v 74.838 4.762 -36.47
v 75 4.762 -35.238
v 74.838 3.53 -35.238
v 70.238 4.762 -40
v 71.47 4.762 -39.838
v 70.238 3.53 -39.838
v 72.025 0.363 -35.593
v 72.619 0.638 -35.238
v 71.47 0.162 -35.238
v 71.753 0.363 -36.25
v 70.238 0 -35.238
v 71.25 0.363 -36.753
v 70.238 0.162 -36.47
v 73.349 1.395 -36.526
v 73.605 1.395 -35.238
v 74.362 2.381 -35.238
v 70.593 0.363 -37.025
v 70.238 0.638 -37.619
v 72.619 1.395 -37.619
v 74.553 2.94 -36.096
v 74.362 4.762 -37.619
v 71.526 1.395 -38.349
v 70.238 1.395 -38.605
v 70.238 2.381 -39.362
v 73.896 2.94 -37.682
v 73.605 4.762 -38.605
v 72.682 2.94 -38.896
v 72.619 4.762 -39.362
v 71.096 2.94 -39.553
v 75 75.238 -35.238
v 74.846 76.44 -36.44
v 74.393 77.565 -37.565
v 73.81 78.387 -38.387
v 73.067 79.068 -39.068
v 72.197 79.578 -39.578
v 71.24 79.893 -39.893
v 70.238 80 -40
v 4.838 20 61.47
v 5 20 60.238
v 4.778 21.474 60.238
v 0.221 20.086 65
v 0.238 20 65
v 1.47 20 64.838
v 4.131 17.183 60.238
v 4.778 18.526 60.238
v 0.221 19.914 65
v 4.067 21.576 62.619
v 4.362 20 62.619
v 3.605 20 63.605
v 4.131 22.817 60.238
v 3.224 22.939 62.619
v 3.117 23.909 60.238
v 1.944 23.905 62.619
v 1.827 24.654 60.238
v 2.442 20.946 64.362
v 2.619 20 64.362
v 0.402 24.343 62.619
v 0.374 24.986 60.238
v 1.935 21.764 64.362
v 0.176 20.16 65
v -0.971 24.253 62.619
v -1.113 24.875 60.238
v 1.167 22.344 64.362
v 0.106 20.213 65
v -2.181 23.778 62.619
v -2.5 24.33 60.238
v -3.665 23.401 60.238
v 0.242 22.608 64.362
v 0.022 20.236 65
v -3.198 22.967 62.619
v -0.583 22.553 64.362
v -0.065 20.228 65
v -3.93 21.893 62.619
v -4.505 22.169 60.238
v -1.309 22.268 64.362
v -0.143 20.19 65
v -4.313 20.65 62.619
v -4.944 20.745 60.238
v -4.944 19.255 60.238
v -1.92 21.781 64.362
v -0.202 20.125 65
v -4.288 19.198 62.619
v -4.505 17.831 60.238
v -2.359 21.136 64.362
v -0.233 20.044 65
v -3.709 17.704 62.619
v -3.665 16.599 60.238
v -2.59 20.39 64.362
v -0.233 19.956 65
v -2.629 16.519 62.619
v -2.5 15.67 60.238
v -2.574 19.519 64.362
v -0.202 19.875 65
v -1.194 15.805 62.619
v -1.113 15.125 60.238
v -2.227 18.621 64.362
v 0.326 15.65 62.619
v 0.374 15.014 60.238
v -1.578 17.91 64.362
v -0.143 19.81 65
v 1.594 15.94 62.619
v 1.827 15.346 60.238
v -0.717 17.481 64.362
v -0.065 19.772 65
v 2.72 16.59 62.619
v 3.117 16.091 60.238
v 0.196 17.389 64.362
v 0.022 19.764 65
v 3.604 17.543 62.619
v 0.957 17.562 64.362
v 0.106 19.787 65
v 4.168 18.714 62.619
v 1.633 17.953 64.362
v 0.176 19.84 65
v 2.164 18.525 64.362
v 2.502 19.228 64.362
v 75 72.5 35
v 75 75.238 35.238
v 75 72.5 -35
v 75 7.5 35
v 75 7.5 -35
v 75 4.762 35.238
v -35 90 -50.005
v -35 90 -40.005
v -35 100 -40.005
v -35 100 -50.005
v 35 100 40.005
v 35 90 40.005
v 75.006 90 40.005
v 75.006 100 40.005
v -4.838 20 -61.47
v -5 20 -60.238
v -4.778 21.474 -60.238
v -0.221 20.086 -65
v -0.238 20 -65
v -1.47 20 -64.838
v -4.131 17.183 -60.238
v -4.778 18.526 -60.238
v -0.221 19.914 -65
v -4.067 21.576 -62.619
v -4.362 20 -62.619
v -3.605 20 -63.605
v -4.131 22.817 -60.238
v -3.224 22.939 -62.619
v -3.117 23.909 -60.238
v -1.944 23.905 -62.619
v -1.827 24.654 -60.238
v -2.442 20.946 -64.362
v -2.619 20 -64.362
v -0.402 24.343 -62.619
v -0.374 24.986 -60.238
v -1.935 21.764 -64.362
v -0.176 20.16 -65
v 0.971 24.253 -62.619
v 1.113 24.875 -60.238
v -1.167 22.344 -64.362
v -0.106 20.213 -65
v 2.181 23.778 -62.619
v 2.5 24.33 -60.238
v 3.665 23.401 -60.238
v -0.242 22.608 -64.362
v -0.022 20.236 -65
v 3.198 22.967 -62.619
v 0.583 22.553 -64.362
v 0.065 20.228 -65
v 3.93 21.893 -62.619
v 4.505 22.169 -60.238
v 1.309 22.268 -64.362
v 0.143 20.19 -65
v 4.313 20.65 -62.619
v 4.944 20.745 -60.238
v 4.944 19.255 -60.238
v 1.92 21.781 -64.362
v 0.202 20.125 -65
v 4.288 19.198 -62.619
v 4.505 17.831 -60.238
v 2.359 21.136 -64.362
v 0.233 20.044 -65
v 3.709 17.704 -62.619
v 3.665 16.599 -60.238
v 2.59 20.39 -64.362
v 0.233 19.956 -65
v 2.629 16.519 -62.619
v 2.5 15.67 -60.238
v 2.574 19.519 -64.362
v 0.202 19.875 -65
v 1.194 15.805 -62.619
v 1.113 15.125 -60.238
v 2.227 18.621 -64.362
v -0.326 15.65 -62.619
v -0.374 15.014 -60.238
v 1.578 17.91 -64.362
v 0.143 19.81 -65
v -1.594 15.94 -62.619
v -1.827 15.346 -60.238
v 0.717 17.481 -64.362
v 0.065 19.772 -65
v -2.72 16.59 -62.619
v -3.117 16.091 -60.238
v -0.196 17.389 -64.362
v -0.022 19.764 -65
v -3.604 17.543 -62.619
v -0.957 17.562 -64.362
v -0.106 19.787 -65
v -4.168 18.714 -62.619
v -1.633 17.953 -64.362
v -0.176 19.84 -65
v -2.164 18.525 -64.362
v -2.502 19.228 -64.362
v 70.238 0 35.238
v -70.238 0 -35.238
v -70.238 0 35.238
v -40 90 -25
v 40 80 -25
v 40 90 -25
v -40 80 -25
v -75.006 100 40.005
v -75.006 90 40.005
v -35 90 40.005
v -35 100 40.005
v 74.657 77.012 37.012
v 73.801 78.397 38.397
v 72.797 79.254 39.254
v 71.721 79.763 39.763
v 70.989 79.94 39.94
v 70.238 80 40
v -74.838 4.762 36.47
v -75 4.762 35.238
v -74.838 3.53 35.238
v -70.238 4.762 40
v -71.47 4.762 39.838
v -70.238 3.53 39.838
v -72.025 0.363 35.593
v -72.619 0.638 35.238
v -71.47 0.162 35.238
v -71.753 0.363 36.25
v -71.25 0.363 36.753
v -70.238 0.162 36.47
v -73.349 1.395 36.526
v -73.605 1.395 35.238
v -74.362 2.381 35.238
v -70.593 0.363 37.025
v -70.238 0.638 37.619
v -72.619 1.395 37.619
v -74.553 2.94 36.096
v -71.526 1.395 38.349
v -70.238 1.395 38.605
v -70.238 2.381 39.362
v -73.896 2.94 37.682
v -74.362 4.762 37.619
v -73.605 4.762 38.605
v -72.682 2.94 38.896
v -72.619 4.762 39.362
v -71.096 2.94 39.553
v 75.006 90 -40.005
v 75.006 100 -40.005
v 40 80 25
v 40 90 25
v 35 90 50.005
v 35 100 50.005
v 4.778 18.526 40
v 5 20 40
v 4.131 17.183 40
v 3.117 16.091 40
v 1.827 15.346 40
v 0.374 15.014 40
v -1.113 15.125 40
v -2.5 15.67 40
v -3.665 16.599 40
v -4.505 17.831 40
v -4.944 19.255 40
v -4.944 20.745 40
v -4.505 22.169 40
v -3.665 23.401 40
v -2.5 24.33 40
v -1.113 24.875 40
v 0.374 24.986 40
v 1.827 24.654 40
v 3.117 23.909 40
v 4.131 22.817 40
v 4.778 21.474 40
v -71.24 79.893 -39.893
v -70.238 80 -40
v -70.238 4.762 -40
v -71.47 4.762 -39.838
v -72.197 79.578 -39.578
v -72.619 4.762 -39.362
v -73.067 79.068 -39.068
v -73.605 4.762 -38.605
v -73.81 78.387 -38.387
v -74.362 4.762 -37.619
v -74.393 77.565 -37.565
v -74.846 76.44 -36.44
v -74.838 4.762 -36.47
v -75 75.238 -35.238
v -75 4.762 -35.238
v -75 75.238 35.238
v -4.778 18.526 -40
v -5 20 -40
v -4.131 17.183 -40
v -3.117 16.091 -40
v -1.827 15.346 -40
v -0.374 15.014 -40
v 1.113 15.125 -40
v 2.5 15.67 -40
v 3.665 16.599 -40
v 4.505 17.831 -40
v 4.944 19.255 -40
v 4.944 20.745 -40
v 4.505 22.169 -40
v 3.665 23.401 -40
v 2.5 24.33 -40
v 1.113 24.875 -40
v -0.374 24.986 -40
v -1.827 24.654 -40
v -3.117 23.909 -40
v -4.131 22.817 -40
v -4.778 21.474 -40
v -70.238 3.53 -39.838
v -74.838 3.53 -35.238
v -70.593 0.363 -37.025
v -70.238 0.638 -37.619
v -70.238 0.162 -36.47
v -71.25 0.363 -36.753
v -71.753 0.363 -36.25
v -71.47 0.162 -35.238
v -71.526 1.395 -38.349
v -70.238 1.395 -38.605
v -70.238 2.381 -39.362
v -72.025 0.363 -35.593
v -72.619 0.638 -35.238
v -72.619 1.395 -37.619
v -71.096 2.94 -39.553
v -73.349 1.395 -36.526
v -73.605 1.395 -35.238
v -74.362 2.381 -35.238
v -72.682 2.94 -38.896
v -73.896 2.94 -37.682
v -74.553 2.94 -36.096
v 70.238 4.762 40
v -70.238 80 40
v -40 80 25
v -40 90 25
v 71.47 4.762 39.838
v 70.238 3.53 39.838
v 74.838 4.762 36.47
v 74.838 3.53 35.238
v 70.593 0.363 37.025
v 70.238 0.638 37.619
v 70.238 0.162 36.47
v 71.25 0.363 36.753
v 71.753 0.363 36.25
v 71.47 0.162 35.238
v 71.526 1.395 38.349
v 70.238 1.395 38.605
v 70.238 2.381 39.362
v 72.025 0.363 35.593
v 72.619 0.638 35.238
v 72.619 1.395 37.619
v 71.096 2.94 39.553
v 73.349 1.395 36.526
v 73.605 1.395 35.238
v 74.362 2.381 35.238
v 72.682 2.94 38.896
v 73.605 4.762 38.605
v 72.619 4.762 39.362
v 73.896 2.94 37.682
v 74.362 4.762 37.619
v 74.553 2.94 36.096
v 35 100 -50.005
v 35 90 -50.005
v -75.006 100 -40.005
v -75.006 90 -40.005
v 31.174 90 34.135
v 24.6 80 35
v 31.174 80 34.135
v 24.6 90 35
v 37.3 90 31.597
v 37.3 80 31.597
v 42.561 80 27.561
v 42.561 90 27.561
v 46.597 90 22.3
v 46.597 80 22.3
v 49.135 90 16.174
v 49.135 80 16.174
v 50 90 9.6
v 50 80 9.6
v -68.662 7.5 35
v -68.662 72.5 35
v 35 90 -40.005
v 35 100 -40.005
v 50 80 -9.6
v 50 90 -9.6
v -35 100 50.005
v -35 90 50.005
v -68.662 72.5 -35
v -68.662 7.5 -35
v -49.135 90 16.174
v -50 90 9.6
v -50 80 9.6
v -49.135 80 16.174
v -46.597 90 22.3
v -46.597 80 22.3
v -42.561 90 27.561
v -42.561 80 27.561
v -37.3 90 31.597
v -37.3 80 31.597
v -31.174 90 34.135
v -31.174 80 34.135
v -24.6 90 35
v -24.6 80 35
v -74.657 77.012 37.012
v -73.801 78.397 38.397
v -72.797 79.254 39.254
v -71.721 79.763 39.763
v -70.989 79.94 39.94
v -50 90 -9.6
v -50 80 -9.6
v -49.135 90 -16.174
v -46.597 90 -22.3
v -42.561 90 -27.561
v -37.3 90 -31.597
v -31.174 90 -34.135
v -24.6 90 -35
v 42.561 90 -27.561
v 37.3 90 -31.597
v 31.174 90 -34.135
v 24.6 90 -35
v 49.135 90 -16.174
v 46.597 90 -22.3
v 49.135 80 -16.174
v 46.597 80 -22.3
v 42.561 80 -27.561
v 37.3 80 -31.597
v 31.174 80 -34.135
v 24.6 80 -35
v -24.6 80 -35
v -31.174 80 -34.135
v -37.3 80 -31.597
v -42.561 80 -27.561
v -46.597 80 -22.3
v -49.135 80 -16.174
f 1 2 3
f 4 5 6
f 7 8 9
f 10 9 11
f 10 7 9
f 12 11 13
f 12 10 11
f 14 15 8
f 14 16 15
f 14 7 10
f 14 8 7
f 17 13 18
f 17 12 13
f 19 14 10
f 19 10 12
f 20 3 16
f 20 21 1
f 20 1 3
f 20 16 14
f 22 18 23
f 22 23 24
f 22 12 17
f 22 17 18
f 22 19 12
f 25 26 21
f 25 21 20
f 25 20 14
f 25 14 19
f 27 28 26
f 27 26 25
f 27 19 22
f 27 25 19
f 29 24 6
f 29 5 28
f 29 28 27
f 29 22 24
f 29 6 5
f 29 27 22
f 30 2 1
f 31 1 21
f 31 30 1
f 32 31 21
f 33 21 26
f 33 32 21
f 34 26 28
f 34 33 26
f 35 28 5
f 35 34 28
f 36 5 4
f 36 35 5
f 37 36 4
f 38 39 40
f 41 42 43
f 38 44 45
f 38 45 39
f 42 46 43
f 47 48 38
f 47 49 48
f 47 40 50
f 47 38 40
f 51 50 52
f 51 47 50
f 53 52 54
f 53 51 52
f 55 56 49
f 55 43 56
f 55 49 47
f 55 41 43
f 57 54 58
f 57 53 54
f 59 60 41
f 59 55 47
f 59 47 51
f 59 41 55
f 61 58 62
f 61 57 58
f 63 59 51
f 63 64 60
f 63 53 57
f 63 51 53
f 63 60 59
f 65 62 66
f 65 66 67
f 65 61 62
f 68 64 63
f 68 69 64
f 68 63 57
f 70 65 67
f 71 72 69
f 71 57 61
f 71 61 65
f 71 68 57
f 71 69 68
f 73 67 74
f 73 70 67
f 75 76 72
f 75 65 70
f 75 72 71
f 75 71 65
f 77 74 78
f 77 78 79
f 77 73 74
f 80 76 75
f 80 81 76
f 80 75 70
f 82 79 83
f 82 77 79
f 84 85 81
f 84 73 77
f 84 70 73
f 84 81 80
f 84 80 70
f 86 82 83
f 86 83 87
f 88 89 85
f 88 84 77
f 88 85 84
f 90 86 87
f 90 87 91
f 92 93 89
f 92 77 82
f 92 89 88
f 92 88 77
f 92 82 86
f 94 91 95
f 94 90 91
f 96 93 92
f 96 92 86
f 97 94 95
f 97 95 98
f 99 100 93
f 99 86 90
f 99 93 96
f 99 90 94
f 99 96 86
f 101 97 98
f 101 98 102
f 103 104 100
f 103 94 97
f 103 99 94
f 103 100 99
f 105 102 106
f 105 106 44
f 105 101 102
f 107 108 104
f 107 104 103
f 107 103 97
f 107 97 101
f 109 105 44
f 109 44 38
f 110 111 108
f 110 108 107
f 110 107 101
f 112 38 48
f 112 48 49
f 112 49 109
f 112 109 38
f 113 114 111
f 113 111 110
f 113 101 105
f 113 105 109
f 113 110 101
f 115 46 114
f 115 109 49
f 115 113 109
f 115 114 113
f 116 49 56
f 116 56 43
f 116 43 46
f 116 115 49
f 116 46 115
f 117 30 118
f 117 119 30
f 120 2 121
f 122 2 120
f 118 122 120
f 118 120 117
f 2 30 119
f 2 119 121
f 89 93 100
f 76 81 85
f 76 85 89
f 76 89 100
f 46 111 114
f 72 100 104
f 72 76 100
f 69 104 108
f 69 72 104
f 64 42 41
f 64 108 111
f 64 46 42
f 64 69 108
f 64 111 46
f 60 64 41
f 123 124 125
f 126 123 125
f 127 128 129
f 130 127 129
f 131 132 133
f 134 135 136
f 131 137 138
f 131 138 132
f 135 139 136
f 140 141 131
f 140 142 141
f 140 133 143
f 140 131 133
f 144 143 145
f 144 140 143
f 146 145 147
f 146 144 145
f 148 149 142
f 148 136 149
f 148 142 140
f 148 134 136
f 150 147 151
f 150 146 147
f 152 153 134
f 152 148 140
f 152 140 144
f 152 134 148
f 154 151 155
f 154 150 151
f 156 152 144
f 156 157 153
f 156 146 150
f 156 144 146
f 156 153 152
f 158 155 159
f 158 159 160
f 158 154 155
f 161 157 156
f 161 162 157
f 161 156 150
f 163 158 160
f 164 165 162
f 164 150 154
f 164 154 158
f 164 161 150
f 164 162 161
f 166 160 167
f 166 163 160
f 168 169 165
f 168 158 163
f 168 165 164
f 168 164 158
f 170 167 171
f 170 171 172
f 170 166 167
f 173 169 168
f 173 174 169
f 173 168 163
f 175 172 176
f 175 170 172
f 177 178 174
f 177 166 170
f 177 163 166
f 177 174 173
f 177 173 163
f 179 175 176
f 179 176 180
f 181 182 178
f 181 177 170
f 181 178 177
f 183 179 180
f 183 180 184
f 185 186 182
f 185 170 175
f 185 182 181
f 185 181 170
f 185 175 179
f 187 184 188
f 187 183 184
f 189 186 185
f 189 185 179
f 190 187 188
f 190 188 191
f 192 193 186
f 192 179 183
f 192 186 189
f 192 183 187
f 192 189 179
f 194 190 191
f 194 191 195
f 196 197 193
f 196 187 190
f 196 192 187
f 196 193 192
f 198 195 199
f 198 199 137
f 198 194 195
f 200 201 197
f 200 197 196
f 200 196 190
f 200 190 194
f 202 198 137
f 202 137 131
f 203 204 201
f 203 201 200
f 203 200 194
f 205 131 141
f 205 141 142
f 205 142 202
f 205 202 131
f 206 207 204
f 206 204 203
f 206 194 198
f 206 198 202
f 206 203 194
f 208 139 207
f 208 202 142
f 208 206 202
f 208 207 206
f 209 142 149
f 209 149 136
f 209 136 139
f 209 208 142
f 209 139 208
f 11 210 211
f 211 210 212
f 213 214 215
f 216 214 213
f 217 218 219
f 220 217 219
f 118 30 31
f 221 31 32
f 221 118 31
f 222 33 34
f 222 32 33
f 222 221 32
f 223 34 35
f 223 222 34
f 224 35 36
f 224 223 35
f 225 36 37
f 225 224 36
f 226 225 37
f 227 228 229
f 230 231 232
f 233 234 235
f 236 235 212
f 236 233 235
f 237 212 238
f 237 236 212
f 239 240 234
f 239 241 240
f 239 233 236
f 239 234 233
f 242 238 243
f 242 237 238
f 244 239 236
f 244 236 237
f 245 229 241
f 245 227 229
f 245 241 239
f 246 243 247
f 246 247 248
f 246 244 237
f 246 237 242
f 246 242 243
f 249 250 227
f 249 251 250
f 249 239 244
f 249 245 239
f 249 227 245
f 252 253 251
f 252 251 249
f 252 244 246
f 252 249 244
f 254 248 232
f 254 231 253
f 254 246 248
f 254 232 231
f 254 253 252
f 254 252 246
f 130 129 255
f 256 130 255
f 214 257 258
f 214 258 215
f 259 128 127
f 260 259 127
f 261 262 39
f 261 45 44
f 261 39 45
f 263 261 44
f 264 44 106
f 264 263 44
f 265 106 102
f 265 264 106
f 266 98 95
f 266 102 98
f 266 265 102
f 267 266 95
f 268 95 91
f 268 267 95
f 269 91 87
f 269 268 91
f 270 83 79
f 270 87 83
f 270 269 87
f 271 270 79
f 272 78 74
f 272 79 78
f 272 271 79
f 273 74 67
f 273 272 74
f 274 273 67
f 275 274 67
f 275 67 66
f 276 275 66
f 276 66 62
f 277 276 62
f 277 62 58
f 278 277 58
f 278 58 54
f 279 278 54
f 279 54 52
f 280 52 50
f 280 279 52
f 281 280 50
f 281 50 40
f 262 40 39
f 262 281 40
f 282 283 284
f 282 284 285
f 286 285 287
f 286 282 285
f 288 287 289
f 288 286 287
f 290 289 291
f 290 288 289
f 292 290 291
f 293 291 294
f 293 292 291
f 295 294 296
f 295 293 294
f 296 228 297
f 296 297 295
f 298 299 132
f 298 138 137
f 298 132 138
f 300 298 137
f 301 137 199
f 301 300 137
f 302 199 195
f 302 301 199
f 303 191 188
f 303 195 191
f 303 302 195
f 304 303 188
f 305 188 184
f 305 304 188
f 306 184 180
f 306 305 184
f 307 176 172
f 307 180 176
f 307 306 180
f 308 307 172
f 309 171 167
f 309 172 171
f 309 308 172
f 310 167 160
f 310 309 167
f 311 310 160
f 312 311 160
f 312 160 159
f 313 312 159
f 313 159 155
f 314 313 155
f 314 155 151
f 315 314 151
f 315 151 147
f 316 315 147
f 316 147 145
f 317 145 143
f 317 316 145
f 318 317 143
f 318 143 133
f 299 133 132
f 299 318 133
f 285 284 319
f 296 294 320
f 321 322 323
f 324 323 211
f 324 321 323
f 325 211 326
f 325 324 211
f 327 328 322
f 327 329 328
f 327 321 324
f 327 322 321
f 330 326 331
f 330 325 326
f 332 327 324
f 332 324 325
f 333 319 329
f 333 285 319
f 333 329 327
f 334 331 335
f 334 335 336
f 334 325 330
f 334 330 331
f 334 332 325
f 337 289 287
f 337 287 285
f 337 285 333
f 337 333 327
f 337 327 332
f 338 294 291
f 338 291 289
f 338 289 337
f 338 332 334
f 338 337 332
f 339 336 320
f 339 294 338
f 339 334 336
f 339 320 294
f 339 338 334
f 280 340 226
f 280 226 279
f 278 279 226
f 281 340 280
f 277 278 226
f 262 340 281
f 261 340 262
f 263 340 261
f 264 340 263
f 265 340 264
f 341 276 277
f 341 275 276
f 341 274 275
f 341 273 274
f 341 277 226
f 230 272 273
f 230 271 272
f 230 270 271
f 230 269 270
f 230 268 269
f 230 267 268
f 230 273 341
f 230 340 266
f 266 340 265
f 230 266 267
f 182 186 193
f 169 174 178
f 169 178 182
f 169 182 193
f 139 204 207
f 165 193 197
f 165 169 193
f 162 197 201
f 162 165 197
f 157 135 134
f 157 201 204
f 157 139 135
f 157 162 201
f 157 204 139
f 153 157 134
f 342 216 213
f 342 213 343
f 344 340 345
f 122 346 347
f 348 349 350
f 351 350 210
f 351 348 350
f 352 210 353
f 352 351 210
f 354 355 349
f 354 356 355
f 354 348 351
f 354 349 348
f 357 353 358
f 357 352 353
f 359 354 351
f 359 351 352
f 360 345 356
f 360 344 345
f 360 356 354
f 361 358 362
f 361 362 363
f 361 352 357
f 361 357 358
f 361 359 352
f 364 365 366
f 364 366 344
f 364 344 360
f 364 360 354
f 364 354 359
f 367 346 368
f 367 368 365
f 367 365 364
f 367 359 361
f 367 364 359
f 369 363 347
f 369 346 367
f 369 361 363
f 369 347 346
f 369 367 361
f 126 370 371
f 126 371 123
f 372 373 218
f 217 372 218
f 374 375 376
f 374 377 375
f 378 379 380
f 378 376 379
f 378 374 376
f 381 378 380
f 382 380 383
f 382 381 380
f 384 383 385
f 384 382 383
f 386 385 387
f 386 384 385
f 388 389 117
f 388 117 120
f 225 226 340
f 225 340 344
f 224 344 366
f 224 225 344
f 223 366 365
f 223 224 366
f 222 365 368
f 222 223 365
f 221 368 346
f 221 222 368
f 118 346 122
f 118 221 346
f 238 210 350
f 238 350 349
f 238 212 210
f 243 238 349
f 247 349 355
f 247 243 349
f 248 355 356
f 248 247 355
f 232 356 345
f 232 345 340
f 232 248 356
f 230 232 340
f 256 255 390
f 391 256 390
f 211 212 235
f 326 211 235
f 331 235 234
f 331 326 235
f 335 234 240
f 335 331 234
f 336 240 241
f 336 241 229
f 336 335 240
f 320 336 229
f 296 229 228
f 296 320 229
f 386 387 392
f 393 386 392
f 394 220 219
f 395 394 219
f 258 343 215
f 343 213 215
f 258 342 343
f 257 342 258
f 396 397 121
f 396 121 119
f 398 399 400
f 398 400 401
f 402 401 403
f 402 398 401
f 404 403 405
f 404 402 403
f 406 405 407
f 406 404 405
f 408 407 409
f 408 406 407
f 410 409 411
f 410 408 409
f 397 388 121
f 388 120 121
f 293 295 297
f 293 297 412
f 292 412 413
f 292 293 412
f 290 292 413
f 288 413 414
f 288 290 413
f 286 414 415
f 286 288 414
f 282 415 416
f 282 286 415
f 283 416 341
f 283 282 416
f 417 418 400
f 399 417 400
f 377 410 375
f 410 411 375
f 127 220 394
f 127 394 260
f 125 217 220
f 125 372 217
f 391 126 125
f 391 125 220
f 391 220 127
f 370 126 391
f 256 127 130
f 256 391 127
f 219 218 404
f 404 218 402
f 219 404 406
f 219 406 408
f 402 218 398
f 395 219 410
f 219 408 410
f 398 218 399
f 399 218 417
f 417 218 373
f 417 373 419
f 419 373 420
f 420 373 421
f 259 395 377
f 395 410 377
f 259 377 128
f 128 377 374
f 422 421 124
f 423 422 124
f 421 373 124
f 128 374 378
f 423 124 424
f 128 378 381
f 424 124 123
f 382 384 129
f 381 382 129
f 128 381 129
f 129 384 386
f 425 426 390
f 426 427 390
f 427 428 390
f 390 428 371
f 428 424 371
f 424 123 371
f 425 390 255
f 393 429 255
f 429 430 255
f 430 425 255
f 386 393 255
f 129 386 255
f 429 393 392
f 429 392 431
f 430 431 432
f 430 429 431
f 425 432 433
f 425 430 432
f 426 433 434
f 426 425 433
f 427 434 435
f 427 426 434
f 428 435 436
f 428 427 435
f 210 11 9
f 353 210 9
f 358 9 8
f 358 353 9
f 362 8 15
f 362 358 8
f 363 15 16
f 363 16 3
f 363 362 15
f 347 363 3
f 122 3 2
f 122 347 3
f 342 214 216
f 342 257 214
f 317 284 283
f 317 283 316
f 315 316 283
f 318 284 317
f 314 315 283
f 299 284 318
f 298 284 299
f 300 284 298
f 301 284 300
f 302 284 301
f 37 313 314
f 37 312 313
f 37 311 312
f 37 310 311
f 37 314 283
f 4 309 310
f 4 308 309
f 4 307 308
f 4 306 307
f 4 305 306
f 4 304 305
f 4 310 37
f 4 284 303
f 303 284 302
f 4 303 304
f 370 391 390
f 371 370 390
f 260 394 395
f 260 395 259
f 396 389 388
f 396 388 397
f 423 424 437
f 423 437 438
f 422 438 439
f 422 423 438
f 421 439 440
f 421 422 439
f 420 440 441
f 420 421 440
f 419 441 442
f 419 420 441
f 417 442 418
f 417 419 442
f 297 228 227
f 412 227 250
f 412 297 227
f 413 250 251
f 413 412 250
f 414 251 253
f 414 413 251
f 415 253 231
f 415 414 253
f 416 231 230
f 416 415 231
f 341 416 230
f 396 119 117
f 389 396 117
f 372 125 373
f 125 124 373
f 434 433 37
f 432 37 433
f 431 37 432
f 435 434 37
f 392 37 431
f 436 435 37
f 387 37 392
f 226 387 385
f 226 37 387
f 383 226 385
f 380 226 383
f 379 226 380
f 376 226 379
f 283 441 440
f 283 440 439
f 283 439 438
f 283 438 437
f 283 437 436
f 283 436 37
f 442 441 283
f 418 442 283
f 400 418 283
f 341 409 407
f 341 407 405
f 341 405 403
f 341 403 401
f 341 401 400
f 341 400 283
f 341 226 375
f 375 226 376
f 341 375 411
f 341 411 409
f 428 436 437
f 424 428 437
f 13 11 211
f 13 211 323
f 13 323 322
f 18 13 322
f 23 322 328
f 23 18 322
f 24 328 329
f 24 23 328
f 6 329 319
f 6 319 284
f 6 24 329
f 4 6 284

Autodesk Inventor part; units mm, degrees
ref_plane "YZ Plane" through (0, 0, 0) normal (1, 0, 0) x (0, 1, 0)
ref_plane "XZ Plane" through (0, 0, 0) normal (0, 1, 0) x (-1, 0, 0)
ref_plane "XY Plane" through (0, 0, 0) normal (0, 0, 1) x (1, 0, 0)
sketch "Sketch1" plane through (0, 0, 0) normal (0, 1, 0) x (-1, 0, 0)
  line L0 (75, -40) -> (-75, -40)
  line L1 (-75, -40) -> (-75, 40)
  line L2 (-75, 40) -> (75, 40)
  line L3 (75, 40) -> (75, -40)
  line L4 (75, -40) -> (-75, 40) construction
  line L5 (-75, -40) -> (75, 40) construction
  point P0 (0, 0)
  dimension "d0" = 80
  dimension "d1" = 150
extrude "Extrusion1" add sketch "Sketch1" along normal blind 80
sketch "Sketch2" plane through (75, 0, 40) normal (1, 0, 0) x (0, 0, -1)
  line L0 (0, 0) -> (0, 80) projected
  line L1 (0, 40) -> (80, 40)
  line L2 (80, 0) -> (80, 80) projected
  line L3 (40, 0) -> (40, 80)
  line L4 (0, 80) -> (80, 80) projected
  line L5 (75, 72.5) -> (5, 72.5)
  line L6 (5, 72.5) -> (5, 7.5)
  line L7 (5, 7.5) -> (75, 7.5)
  line L8 (75, 7.5) -> (75, 72.5)
  line L9 (75, 72.5) -> (5, 7.5) construction
  line L10 (5, 72.5) -> (75, 7.5) construction
  point P0 (40, 40)
  dimension "d4" = 70
  dimension "d5" = 65
extrude "Extrusion2" cut sketch "Sketch2" against normal blind 143.6625 contours L6 L5 L3 L1 | L1 L3 L7 L6 | L3 L5 L8 L1 | L1 L8 L7 L3
sketch "Sketch8" plane through (-75, 0, 40) normal (0, 0, 1) x (1, 0, 0)
  line L0 (0, 0) -> (0, 80) projected
  line L1 (0, 40) -> (75, 40) construction
  line L2 (75, 40) -> (75, 0) construction
  line L3 (0, 20) -> (75, 20) construction
  circle A0 centre (75, 20) radius 5
  dimension "d24" = 10
extrude "Extrusion5" add sketch "Sketch8" along normal blind 25
sketch "Sketch9" plane through (75, 0, -40) normal (0, 0, -1) x (-1, 0, 0)
  line L0 (0, 0) -> (0, 80) projected
  line L1 (0, 40) -> (75, 40) construction
  line L2 (75, 40) -> (75, 0) construction
  circle A0 centre (75, 20) radius 5 projected
  line L3 (0, 20) -> (75, 20) construction
  circle A1 centre (75, 20) radius 5
  dimension "d25" = 10
extrude "Extrusion6" add sketch "Sketch9" along normal blind 25
fillet "Fillet1" radius 4.7625 1 edges at (-5, 20, 65)
fillet "Fillet2" radius 4.7625 1 edges at (5, 20, -65)
fillet "Fillet3" radius 4.7625 10 edges at (-75, 40, -40) (-75, 40, 40) (75, 40, 40) (75, 40, -40) (-75, 80, 0) (75, 80, 0) (-75, 0, 0) (0, 0, -40) (75, 0, 0) (0, 0, 40)
sketch "Sketch10" plane through (0, 80, 0) normal (0, 1, 0) x (1, 0, 0)
  line L0 (50, 35) -> (-50, 35)
  line L1 (-50, 35) -> (-50, -35)
  line L2 (-50, -35) -> (50, -35)
  line L3 (50, -35) -> (50, 35)
  line L4 (50, 35) -> (-50, -35) construction
  line L5 (-50, 35) -> (50, -35) construction
  line L6 (40, 25) -> (-40, 25)
  line L7 (-40, 25) -> (-40, -25)
  line L8 (-40, -25) -> (40, -25)
  line L9 (40, -25) -> (40, 25)
  line L10 (40, 25) -> (-40, -25) construction
  line L11 (-40, 25) -> (40, -25) construction
  point P0 (0, 0)
  dimension "d29" = 70
  dimension "d30" = 100
  dimension "d31" = 10
  dimension "d32" = 10
extrude "Extrusion7" add sketch "Sketch10" along normal blind 10
sketch "Sketch11" plane through (0, 90, 0) normal (0, 1, 0) x (1, 0, 0)
  line L0 (75.0062, 40.005) -> (-75.0062, 40.005)
  line L1 (-75.0062, 40.005) -> (-75.0062, -40.005)
  line L2 (-75.0062, -40.005) -> (75.0062, -40.005)
  line L3 (75.0062, -40.005) -> (75.0062, 40.005)
  line L4 (75.0062, 40.005) -> (-75.0062, -40.005) construction
  line L5 (-75.0062, 40.005) -> (75.0062, -40.005) construction
  point P0 (0, 0)
  dimension "d35" = 80.01
  dimension "d36" = 150.0124
extrude "Extrusion8" add sketch "Sketch11" along normal blind 10
sketch "Sketch12" plane through (-75.0062, 90, 40.005) normal (0, 0, 1) x (1, 0, 0)
  line L0 (150.0124, 10) -> (0, 10) construction
  line L1 (150.0124, 0) -> (0, 0) construction
  line L2 (0, 10) -> (150.0124, 0) construction
  line L3 (0, 0) -> (150.0124, 10) construction
  line L4 (35.0062, 0) -> (115.0062, 0) projected
  line L5 (110.0062, 10) -> (40.0062, 10)
  line L6 (40.0062, 10) -> (40.0062, 0)
  line L7 (40.0062, 0) -> (110.0062, 0)
  line L8 (110.0062, 0) -> (110.0062, 10)
  line L9 (110.0062, 10) -> (40.0062, 0) construction
  line L10 (40.0062, 10) -> (110.0062, 0) construction
  point P0 (75.0062, -90)
  point P1 (75.0062, 5)
  dimension "d39" = 70
extrude "Extrusion9" add sketch "Sketch12" along normal blind 10
sketch "Sketch13" plane through (75.0062, 90, -40.005) normal (0, 0, -1) x (-1, 0, 0)
  line L0 (0, 0) -> (150.0124, 0) projected
  line L1 (150.0124, 0) -> (150.0124, 10) projected
  line L2 (0, 10) -> (150.0124, 10) projected
  line L3 (0, 0) -> (0, 10) projected
  line L4 (0, 10) -> (150.0124, 0) construction
  line L5 (150.0124, 10) -> (0, 0) construction
  line L6 (35.0062, 0) -> (115.0062, 0) projected
  line L7 (110.0062, 10) -> (40.0062, 10)
  line L8 (40.0062, 10) -> (40.0062, 0)
  line L9 (40.0062, 0) -> (110.0062, 0)
  line L10 (110.0062, 0) -> (110.0062, 10)
  line L11 (110.0062, 10) -> (40.0062, 0) construction
  line L12 (40.0062, 10) -> (110.0062, 0) construction
  point P0 (75.0062, -90)
  point P1 (75.0062, 5)
  point P2 (110.0062, 10)
  point P3 (40.0062, 10)
  dimension "d42" = 70
extrude "Extrusion10" add sketch "Sketch13" along normal blind 10 contours L8 L2 L10 L0
fillet "Fillet4" radius 25.4 4 edges at (50, 85, -35) (50, 85, 35) (-50, 85, 35) (-50, 85, -35)
properties part number "Battery Container" material "Iron, Malleable"
